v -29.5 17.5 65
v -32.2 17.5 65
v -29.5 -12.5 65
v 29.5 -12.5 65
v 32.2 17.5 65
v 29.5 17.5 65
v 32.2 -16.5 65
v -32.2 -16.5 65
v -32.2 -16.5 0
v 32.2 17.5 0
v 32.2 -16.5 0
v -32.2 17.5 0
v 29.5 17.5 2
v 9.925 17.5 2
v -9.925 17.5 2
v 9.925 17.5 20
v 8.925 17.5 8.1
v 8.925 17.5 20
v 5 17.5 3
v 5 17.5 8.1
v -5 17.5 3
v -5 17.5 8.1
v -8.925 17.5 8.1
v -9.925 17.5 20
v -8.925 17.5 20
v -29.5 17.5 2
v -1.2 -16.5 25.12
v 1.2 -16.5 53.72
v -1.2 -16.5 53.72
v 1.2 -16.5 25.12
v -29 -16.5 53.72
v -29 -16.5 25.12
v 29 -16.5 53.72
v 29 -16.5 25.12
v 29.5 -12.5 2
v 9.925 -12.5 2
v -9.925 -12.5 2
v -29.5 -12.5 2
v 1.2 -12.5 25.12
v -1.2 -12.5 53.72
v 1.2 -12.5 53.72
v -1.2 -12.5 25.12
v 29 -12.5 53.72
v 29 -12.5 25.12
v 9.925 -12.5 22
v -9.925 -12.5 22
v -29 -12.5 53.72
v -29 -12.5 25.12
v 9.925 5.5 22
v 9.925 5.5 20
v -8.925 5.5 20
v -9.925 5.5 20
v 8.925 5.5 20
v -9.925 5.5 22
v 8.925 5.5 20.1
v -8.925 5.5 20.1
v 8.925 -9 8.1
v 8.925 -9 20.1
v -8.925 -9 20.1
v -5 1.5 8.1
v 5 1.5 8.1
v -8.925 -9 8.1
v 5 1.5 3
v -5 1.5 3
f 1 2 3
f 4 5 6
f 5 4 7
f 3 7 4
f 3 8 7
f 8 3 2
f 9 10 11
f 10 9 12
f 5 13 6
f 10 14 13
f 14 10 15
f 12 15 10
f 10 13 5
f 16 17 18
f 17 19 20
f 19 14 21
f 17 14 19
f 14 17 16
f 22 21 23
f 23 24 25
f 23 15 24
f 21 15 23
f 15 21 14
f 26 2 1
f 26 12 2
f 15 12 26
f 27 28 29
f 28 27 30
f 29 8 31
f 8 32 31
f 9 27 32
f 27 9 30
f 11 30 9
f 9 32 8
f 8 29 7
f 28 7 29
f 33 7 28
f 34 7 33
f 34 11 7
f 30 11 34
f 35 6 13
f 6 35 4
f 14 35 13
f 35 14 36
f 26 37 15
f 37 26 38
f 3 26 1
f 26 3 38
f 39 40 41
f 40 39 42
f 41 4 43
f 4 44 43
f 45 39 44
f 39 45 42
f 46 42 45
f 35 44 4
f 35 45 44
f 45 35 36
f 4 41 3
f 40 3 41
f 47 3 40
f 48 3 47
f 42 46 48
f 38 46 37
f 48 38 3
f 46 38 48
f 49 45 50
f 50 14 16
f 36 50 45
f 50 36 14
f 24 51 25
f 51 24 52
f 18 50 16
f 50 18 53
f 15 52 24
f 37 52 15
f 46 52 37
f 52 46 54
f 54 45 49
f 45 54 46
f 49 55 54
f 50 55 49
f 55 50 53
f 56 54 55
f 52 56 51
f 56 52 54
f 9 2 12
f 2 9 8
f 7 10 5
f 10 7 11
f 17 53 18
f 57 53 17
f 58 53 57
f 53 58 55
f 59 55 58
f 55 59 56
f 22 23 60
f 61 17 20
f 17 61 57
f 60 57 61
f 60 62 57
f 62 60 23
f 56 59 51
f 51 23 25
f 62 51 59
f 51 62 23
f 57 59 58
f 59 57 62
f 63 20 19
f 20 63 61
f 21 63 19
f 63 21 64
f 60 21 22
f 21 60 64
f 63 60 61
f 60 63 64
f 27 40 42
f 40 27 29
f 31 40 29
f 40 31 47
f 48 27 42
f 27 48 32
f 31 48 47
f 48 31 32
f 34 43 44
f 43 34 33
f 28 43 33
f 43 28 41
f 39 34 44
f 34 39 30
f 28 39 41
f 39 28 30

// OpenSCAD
// ==========================================
// CLAW-D MASCOT: INTERNAL ELECTRONICS SLED
// ==========================================

oled_w = 27.8; // old: 27.8
oled_h = 28.6; // old: 28.0 & 28.02

esp_l = 26.5; // esp cradel wall length
esp_w = 17.85; // esp cradel wall space distance (old: 18mm)
esp_h = 12.0; // esp cradel wall height
esp_z_lift = 6.0; // Raises the board to create component clearance underneath
esp_y_offset = 0; // Negative = closer to the front wall, Positive = further back

sled_width = 63.0;  

// --- ASYMMETRICAL ADJUSTMENT ---
// Front restored to original position (-16.5)
// Back extended by exactly 1mm from original (16.5 -> 17.5)
front_y = -16.5; 
back_y = 17.5;   
sled_depth = back_y - front_y; // Dynamically calculates to 34.0mm

sled_height = 65.0; 
wall_thick = 2.0;
front_wall_thick = 4.0; // RESTORED to 4.0 for OLED clearance
eye_z_offset = 25.12; // eyehole vertical position

render_sled();

module render_sled() {
    difference() {
        union() {
            // Main U-Shape Sled
            difference() {
                translate([-sled_width/2, front_y, 0])
                    cube([sled_width, sled_depth, sled_height]);
                
                translate([-(sled_width - wall_thick*2)/2, front_y + front_wall_thick, wall_thick])
                    cube([sled_width - wall_thick*2, sled_depth, sled_height]);
            }
            
            // ESP32 Cradle Base (Extended to front wall, raised by 2mm)
            translate([-(esp_w + 2)/2, front_y + front_wall_thick, wall_thick])
                cube([esp_w + 2, back_y - (front_y + front_wall_thick), esp_h + esp_z_lift]);

            // ESP32 Cradle shelf (Raised by 2mm)
            translate([-(esp_w + 2)/2, front_y + front_wall_thick, wall_thick + 12 + esp_z_lift])
                cube([esp_w + 2, ((back_y - esp_l + esp_y_offset) - (front_y + front_wall_thick)) + 14.5, 2]);
                
    
            // 0.5mm Friction Tolerance Rails (outside of sled to easily adjust length)
            translate([-sled_width/2 - 0.7, front_y, 0])
                cube([0.7, sled_depth, sled_height]);
            translate([sled_width/2, front_y, 0])
                cube([0.7, sled_depth, sled_height]);
        }
        
        // --- SUBTRACTIONS ---
        
        // ESP32 Drop-In Seat 
        // Lifted by esp_z_lift so the board rests on a 2mm ledge
        translate([-esp_w/2, back_y - esp_l + esp_y_offset, wall_thick + esp_z_lift + 0.1])
            cube([esp_w, esp_l + 1, esp_h]);

        // ESP32 Underside Component Clearance (USB & Buttons)
        // 10mm wide gap leaves ~3.9mm ledges on both sides for the board to sit on.
        depth = back_y - 16 + esp_y_offset;
        translate([-10/2, depth, 3])
            cube([10, 16.1, esp_z_lift + 0.2]);

        // Left OLED Pocket
        translate([-sled_width/2 + wall_thick + 0.5, front_y - 0.1, eye_z_offset])
            cube([oled_w, front_wall_thick + 1, oled_h]);
            
        // Right OLED Pocket
        translate([sled_width/2 - wall_thick - 0.5 - oled_w, front_y - 0.1, eye_z_offset])
            cube([oled_w, front_wall_thick + 1, oled_h]);
    }
}
